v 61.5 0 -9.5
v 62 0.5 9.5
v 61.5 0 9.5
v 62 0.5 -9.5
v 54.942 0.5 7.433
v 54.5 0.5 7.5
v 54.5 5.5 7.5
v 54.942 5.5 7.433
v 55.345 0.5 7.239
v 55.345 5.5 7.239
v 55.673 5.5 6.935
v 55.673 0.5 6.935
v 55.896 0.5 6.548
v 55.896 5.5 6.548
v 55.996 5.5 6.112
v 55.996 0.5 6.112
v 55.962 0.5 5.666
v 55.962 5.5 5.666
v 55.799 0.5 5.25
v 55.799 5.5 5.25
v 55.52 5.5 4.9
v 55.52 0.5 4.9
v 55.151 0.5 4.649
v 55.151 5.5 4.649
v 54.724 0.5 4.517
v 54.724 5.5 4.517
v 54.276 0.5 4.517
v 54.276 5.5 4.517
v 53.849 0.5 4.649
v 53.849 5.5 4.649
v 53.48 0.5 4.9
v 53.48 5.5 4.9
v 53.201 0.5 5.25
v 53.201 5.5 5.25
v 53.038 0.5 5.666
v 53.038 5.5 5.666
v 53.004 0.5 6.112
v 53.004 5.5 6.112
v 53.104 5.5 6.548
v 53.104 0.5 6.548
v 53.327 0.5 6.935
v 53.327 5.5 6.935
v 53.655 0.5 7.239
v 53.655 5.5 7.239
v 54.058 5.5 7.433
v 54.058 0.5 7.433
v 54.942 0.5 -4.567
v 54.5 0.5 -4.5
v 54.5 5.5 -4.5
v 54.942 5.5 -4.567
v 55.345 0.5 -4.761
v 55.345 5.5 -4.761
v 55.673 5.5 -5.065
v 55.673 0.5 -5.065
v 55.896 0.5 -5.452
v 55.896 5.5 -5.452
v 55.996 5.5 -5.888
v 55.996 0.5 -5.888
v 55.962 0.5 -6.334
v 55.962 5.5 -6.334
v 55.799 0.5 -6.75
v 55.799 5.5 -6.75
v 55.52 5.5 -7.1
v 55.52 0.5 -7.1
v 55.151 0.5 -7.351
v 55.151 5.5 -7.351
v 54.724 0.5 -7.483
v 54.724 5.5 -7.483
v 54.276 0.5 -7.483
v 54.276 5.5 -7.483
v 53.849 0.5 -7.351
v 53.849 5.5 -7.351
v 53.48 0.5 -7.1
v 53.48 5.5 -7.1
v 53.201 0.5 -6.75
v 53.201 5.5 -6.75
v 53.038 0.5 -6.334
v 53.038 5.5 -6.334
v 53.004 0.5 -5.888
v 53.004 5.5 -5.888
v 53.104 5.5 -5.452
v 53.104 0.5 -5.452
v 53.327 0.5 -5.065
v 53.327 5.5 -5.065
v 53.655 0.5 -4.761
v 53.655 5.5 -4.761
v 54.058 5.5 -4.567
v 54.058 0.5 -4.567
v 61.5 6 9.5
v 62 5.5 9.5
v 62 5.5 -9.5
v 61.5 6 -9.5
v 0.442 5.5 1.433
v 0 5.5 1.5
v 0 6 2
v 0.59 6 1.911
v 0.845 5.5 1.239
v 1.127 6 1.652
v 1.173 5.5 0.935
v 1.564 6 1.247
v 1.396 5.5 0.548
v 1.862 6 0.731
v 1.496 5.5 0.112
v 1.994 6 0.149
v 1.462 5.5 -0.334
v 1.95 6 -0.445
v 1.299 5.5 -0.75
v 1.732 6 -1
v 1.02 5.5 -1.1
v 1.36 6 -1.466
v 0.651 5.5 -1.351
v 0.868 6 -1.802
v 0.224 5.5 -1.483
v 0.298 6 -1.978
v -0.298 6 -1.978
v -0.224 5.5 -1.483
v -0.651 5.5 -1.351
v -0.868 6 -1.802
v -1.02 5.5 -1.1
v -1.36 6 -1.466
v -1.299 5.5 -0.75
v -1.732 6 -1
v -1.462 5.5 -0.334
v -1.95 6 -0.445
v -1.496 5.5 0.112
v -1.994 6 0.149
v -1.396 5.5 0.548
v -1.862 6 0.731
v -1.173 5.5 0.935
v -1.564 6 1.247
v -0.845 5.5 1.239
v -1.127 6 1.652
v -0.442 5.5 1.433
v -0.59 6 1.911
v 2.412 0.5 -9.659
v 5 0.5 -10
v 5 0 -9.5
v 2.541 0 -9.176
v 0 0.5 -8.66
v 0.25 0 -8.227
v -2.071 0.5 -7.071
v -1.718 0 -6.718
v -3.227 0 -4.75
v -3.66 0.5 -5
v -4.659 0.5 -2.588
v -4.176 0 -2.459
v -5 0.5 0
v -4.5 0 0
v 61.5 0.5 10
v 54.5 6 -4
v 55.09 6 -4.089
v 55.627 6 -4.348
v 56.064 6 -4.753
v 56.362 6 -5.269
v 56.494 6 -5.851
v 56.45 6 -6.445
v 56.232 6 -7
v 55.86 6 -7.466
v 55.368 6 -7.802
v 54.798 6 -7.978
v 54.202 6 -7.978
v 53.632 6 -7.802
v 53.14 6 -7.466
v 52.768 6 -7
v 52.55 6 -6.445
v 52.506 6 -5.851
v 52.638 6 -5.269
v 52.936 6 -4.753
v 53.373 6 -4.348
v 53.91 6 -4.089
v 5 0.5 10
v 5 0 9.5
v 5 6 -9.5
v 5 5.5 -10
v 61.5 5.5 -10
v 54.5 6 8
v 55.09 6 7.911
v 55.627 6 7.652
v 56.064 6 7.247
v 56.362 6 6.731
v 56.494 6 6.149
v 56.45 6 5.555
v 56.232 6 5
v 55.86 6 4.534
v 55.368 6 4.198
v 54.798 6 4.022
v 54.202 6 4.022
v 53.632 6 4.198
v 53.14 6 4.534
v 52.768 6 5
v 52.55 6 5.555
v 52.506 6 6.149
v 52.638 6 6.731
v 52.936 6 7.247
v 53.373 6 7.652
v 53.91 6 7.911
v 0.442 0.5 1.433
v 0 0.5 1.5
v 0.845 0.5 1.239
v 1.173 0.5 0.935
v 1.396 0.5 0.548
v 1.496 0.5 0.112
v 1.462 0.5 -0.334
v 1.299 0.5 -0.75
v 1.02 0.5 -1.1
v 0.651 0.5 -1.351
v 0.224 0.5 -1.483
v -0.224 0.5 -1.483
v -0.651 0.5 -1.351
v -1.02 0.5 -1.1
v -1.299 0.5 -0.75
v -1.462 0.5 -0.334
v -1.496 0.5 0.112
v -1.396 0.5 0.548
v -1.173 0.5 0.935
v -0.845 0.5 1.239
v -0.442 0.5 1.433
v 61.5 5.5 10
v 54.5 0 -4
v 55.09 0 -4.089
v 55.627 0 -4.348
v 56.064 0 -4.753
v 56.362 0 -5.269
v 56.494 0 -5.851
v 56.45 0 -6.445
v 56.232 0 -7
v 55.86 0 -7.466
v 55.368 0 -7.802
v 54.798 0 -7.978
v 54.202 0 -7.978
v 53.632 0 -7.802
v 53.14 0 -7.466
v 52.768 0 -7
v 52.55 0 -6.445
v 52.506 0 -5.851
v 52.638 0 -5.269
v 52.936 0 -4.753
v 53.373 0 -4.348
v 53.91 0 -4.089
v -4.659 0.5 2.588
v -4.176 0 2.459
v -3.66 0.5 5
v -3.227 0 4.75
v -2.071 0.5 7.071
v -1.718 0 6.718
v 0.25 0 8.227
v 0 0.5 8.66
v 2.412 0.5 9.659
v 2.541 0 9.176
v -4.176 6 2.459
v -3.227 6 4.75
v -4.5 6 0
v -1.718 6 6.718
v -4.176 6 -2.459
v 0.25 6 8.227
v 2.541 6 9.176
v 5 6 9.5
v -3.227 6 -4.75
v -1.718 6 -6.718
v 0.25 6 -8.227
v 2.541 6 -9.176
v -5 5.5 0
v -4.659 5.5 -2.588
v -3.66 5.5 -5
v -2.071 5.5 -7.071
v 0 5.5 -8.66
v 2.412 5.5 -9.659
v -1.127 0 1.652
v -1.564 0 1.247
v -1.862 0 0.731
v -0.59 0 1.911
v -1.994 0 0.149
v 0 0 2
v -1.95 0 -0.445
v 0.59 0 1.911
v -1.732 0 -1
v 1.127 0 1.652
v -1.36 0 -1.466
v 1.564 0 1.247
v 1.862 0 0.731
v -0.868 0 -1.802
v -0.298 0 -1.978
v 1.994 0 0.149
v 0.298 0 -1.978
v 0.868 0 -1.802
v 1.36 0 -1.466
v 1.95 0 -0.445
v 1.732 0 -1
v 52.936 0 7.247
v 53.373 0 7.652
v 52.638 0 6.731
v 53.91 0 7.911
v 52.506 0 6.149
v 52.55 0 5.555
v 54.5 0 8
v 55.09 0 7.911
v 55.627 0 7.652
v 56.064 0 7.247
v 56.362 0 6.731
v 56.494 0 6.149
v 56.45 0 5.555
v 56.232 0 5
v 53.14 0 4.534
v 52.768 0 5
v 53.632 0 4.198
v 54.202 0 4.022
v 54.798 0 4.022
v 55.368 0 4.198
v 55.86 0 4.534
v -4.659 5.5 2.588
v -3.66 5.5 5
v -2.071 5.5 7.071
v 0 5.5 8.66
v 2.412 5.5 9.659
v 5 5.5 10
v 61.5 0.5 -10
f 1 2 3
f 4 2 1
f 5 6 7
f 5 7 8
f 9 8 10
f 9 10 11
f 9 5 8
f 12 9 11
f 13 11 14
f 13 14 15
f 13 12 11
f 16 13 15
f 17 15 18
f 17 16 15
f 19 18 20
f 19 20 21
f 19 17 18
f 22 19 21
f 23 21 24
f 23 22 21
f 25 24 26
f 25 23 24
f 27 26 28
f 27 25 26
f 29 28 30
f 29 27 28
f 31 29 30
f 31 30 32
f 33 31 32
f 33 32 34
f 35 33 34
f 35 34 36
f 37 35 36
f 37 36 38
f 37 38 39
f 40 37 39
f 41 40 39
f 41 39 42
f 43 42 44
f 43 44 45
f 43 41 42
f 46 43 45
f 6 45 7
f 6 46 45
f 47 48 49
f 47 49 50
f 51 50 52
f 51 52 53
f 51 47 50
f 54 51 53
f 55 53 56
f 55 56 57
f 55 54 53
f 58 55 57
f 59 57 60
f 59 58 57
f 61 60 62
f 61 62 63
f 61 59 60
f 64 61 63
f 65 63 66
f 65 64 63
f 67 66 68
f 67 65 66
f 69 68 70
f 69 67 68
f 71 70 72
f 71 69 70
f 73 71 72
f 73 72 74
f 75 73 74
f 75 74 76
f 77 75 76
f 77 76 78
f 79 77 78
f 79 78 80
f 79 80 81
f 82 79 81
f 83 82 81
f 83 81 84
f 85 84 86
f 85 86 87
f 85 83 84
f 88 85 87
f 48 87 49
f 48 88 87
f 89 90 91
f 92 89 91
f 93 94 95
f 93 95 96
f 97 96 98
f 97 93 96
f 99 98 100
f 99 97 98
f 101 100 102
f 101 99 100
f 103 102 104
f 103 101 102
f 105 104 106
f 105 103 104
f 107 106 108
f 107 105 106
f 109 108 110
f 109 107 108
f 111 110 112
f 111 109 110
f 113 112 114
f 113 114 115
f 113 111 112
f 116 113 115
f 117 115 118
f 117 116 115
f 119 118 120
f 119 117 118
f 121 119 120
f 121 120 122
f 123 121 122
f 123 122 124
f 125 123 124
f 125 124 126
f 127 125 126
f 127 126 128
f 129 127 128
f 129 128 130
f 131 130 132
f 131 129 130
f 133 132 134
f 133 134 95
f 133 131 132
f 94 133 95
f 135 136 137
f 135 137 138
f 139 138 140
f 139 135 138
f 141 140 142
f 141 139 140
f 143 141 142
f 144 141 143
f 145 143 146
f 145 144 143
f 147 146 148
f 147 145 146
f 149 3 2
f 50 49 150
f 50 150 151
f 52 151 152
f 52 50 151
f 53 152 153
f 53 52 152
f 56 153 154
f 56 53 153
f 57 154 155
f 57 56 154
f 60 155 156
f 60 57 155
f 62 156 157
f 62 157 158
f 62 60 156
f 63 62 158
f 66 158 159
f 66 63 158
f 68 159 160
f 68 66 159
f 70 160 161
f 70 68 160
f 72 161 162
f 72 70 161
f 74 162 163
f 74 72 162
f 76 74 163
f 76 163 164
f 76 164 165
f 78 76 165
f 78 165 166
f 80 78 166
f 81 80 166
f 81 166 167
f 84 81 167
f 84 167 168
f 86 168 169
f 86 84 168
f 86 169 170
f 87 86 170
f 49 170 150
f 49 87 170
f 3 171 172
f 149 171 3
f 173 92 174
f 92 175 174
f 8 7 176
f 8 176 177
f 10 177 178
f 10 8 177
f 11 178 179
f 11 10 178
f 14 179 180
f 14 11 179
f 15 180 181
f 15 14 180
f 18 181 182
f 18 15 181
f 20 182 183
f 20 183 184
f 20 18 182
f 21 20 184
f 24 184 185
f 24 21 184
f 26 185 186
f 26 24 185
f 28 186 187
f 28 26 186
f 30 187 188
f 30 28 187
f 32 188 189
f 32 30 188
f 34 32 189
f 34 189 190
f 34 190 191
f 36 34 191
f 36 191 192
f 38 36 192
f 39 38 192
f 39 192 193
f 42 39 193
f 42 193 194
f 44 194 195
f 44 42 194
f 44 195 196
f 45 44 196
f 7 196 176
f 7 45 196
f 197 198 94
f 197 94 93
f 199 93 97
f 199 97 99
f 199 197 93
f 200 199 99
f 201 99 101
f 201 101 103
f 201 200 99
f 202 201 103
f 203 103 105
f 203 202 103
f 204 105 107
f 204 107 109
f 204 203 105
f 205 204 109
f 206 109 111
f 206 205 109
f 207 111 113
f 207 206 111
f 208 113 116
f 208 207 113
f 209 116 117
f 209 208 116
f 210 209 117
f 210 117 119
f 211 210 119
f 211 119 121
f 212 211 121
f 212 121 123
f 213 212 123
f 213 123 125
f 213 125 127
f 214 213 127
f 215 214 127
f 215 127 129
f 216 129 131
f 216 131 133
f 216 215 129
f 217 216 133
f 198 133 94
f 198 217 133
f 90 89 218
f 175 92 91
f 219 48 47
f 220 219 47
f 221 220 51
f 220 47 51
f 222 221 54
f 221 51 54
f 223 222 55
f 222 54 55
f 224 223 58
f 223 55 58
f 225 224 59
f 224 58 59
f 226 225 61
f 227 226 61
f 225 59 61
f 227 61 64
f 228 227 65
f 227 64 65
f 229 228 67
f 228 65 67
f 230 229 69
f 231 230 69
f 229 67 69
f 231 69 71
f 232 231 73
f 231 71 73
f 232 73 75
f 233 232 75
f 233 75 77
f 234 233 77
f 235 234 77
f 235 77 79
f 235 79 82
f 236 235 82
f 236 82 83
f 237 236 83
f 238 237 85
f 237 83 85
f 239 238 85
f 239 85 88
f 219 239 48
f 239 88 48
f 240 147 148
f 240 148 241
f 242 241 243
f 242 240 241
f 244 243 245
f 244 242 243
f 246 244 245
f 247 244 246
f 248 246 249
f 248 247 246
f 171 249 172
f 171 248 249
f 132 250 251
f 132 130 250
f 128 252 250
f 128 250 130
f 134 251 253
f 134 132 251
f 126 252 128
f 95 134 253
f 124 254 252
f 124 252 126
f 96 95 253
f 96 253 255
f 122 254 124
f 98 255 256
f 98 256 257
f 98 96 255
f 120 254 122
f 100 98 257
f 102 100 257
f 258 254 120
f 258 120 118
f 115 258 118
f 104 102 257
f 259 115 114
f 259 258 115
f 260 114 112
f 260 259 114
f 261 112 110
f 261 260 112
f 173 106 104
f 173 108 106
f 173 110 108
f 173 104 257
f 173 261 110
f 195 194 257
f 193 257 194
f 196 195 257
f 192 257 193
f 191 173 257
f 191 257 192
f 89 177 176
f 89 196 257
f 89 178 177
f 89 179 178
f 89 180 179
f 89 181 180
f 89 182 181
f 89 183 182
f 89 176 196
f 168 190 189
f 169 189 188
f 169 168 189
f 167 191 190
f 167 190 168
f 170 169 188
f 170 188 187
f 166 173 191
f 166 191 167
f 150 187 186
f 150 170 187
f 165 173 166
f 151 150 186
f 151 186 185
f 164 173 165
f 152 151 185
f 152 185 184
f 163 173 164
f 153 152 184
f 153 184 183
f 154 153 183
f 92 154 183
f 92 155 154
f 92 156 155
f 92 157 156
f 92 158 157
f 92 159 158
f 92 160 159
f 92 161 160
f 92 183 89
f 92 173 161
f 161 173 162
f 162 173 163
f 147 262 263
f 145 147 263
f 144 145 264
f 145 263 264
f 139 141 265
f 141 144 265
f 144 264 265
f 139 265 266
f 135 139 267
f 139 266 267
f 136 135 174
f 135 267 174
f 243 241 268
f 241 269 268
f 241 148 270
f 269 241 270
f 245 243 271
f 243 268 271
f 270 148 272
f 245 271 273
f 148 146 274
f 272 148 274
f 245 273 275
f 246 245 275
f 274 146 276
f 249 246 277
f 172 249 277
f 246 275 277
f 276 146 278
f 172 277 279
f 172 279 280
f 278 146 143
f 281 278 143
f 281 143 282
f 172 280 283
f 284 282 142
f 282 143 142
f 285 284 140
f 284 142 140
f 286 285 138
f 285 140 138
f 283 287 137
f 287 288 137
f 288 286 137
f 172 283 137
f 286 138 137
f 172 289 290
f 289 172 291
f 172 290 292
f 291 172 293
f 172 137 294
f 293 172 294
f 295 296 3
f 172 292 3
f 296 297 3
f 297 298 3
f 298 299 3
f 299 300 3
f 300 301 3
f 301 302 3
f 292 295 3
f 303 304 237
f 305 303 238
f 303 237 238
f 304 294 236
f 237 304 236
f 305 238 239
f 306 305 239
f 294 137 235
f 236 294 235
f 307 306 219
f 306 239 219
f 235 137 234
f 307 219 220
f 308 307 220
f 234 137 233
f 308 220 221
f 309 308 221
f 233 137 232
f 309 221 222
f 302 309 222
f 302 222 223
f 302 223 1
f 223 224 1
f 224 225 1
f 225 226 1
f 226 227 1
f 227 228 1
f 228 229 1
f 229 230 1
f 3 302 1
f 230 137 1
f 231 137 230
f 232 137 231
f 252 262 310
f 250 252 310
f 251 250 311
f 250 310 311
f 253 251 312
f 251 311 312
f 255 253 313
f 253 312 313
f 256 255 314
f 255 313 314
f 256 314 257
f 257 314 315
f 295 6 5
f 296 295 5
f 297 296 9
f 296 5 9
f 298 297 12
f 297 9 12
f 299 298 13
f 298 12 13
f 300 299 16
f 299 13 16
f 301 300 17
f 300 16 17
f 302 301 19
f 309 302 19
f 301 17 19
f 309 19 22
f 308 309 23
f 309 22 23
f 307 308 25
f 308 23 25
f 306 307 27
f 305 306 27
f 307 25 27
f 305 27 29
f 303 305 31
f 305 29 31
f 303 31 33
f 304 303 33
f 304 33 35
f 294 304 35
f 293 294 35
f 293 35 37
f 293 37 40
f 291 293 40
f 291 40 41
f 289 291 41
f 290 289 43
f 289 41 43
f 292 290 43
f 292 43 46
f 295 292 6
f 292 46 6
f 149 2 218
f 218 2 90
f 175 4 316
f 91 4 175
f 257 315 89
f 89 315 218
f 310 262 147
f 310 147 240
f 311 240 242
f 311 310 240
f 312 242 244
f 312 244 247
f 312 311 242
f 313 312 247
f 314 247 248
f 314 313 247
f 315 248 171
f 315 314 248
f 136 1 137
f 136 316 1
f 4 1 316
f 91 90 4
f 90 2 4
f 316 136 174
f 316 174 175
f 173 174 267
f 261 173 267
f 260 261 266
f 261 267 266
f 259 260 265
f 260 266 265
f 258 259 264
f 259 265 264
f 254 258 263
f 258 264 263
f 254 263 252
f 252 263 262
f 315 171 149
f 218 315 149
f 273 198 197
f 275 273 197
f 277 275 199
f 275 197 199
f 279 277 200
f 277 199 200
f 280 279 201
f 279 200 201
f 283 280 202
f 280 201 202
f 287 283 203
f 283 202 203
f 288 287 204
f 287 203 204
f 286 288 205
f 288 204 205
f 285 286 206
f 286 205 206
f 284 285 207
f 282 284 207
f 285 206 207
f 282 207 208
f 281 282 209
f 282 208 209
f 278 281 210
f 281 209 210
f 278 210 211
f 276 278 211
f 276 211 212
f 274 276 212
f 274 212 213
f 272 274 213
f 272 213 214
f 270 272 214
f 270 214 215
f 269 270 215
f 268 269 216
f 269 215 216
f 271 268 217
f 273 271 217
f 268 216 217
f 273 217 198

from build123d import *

# Parameters (mm, degrees)
CROQUIS1_W              = 67
CROQUIS1_H              = 20
CROQUIS1_R              = 1.5
SALIENTE_EXTRUIR1_DEPTH = 6
REDONDEO1_R             = 10
CHAFL_N2_SIZE           = 0.5


with BuildPart() as part:
    # Croquis1 → Saliente-Extruir1 (new body)
    with BuildSketch(Plane(origin=(0, 0, 0), x_dir=(1, 0, 0), z_dir=(0, 1, 0))):
        with Locations((28.5, 0)):
            Rectangle(CROQUIS1_W, CROQUIS1_H)
        with Locations(Location((0, 0, 0), (0, 0, 270))):
            Circle(CROQUIS1_R, mode=Mode.SUBTRACT)
        with Locations(Location((54.5, 6, 0), (0, 0, 270))):
            Circle(CROQUIS1_R, mode=Mode.SUBTRACT)
        with Locations(Location((54.5, -6, 0), (0, 0, 270))):
            Circle(CROQUIS1_R, mode=Mode.SUBTRACT)
    extrude(amount=SALIENTE_EXTRUIR1_DEPTH)

    # Redondeo1
    redondeo1_edges = [part.edges().sort_by_distance(p)[0] for p in [
        (-5, 3, -10),
        (-5, 3, 10),
    ]]
    fillet(redondeo1_edges, radius=REDONDEO1_R - 0.0001)  # a hair under: the kernel refuses the full size

    # Chaflán2
    chafl_n2_edges = [part.edges().sort_by_distance(p)[0] for p in [
        (0, 0, -1.5),
        (0, 6, -1.5),
        (54.5, 0, -7.5),
        (54.5, 6, -7.5),
        (54.5, 0, 4.5),
        (54.5, 6, 4.5),
        (33.49995, 0, 10),
        (-2.071097101, 0, 7.071097101),
        (-2.071097101, 0, -7.071097101),
        (33.49995, 6, 10),
        (-2.071097101, 6, 7.071097101),
        (-2.071097101, 6, -7.071097101),
        (62, 6, 0),
        (33.49995, 0, -10),
        (62, 0, 0),
        (33.49995, 6, -10),
        (62, 3, 10),
        (62, 3, -10),
    ]]
    chamfer(chafl_n2_edges, length=CHAFL_N2_SIZE)


solid = part.part
